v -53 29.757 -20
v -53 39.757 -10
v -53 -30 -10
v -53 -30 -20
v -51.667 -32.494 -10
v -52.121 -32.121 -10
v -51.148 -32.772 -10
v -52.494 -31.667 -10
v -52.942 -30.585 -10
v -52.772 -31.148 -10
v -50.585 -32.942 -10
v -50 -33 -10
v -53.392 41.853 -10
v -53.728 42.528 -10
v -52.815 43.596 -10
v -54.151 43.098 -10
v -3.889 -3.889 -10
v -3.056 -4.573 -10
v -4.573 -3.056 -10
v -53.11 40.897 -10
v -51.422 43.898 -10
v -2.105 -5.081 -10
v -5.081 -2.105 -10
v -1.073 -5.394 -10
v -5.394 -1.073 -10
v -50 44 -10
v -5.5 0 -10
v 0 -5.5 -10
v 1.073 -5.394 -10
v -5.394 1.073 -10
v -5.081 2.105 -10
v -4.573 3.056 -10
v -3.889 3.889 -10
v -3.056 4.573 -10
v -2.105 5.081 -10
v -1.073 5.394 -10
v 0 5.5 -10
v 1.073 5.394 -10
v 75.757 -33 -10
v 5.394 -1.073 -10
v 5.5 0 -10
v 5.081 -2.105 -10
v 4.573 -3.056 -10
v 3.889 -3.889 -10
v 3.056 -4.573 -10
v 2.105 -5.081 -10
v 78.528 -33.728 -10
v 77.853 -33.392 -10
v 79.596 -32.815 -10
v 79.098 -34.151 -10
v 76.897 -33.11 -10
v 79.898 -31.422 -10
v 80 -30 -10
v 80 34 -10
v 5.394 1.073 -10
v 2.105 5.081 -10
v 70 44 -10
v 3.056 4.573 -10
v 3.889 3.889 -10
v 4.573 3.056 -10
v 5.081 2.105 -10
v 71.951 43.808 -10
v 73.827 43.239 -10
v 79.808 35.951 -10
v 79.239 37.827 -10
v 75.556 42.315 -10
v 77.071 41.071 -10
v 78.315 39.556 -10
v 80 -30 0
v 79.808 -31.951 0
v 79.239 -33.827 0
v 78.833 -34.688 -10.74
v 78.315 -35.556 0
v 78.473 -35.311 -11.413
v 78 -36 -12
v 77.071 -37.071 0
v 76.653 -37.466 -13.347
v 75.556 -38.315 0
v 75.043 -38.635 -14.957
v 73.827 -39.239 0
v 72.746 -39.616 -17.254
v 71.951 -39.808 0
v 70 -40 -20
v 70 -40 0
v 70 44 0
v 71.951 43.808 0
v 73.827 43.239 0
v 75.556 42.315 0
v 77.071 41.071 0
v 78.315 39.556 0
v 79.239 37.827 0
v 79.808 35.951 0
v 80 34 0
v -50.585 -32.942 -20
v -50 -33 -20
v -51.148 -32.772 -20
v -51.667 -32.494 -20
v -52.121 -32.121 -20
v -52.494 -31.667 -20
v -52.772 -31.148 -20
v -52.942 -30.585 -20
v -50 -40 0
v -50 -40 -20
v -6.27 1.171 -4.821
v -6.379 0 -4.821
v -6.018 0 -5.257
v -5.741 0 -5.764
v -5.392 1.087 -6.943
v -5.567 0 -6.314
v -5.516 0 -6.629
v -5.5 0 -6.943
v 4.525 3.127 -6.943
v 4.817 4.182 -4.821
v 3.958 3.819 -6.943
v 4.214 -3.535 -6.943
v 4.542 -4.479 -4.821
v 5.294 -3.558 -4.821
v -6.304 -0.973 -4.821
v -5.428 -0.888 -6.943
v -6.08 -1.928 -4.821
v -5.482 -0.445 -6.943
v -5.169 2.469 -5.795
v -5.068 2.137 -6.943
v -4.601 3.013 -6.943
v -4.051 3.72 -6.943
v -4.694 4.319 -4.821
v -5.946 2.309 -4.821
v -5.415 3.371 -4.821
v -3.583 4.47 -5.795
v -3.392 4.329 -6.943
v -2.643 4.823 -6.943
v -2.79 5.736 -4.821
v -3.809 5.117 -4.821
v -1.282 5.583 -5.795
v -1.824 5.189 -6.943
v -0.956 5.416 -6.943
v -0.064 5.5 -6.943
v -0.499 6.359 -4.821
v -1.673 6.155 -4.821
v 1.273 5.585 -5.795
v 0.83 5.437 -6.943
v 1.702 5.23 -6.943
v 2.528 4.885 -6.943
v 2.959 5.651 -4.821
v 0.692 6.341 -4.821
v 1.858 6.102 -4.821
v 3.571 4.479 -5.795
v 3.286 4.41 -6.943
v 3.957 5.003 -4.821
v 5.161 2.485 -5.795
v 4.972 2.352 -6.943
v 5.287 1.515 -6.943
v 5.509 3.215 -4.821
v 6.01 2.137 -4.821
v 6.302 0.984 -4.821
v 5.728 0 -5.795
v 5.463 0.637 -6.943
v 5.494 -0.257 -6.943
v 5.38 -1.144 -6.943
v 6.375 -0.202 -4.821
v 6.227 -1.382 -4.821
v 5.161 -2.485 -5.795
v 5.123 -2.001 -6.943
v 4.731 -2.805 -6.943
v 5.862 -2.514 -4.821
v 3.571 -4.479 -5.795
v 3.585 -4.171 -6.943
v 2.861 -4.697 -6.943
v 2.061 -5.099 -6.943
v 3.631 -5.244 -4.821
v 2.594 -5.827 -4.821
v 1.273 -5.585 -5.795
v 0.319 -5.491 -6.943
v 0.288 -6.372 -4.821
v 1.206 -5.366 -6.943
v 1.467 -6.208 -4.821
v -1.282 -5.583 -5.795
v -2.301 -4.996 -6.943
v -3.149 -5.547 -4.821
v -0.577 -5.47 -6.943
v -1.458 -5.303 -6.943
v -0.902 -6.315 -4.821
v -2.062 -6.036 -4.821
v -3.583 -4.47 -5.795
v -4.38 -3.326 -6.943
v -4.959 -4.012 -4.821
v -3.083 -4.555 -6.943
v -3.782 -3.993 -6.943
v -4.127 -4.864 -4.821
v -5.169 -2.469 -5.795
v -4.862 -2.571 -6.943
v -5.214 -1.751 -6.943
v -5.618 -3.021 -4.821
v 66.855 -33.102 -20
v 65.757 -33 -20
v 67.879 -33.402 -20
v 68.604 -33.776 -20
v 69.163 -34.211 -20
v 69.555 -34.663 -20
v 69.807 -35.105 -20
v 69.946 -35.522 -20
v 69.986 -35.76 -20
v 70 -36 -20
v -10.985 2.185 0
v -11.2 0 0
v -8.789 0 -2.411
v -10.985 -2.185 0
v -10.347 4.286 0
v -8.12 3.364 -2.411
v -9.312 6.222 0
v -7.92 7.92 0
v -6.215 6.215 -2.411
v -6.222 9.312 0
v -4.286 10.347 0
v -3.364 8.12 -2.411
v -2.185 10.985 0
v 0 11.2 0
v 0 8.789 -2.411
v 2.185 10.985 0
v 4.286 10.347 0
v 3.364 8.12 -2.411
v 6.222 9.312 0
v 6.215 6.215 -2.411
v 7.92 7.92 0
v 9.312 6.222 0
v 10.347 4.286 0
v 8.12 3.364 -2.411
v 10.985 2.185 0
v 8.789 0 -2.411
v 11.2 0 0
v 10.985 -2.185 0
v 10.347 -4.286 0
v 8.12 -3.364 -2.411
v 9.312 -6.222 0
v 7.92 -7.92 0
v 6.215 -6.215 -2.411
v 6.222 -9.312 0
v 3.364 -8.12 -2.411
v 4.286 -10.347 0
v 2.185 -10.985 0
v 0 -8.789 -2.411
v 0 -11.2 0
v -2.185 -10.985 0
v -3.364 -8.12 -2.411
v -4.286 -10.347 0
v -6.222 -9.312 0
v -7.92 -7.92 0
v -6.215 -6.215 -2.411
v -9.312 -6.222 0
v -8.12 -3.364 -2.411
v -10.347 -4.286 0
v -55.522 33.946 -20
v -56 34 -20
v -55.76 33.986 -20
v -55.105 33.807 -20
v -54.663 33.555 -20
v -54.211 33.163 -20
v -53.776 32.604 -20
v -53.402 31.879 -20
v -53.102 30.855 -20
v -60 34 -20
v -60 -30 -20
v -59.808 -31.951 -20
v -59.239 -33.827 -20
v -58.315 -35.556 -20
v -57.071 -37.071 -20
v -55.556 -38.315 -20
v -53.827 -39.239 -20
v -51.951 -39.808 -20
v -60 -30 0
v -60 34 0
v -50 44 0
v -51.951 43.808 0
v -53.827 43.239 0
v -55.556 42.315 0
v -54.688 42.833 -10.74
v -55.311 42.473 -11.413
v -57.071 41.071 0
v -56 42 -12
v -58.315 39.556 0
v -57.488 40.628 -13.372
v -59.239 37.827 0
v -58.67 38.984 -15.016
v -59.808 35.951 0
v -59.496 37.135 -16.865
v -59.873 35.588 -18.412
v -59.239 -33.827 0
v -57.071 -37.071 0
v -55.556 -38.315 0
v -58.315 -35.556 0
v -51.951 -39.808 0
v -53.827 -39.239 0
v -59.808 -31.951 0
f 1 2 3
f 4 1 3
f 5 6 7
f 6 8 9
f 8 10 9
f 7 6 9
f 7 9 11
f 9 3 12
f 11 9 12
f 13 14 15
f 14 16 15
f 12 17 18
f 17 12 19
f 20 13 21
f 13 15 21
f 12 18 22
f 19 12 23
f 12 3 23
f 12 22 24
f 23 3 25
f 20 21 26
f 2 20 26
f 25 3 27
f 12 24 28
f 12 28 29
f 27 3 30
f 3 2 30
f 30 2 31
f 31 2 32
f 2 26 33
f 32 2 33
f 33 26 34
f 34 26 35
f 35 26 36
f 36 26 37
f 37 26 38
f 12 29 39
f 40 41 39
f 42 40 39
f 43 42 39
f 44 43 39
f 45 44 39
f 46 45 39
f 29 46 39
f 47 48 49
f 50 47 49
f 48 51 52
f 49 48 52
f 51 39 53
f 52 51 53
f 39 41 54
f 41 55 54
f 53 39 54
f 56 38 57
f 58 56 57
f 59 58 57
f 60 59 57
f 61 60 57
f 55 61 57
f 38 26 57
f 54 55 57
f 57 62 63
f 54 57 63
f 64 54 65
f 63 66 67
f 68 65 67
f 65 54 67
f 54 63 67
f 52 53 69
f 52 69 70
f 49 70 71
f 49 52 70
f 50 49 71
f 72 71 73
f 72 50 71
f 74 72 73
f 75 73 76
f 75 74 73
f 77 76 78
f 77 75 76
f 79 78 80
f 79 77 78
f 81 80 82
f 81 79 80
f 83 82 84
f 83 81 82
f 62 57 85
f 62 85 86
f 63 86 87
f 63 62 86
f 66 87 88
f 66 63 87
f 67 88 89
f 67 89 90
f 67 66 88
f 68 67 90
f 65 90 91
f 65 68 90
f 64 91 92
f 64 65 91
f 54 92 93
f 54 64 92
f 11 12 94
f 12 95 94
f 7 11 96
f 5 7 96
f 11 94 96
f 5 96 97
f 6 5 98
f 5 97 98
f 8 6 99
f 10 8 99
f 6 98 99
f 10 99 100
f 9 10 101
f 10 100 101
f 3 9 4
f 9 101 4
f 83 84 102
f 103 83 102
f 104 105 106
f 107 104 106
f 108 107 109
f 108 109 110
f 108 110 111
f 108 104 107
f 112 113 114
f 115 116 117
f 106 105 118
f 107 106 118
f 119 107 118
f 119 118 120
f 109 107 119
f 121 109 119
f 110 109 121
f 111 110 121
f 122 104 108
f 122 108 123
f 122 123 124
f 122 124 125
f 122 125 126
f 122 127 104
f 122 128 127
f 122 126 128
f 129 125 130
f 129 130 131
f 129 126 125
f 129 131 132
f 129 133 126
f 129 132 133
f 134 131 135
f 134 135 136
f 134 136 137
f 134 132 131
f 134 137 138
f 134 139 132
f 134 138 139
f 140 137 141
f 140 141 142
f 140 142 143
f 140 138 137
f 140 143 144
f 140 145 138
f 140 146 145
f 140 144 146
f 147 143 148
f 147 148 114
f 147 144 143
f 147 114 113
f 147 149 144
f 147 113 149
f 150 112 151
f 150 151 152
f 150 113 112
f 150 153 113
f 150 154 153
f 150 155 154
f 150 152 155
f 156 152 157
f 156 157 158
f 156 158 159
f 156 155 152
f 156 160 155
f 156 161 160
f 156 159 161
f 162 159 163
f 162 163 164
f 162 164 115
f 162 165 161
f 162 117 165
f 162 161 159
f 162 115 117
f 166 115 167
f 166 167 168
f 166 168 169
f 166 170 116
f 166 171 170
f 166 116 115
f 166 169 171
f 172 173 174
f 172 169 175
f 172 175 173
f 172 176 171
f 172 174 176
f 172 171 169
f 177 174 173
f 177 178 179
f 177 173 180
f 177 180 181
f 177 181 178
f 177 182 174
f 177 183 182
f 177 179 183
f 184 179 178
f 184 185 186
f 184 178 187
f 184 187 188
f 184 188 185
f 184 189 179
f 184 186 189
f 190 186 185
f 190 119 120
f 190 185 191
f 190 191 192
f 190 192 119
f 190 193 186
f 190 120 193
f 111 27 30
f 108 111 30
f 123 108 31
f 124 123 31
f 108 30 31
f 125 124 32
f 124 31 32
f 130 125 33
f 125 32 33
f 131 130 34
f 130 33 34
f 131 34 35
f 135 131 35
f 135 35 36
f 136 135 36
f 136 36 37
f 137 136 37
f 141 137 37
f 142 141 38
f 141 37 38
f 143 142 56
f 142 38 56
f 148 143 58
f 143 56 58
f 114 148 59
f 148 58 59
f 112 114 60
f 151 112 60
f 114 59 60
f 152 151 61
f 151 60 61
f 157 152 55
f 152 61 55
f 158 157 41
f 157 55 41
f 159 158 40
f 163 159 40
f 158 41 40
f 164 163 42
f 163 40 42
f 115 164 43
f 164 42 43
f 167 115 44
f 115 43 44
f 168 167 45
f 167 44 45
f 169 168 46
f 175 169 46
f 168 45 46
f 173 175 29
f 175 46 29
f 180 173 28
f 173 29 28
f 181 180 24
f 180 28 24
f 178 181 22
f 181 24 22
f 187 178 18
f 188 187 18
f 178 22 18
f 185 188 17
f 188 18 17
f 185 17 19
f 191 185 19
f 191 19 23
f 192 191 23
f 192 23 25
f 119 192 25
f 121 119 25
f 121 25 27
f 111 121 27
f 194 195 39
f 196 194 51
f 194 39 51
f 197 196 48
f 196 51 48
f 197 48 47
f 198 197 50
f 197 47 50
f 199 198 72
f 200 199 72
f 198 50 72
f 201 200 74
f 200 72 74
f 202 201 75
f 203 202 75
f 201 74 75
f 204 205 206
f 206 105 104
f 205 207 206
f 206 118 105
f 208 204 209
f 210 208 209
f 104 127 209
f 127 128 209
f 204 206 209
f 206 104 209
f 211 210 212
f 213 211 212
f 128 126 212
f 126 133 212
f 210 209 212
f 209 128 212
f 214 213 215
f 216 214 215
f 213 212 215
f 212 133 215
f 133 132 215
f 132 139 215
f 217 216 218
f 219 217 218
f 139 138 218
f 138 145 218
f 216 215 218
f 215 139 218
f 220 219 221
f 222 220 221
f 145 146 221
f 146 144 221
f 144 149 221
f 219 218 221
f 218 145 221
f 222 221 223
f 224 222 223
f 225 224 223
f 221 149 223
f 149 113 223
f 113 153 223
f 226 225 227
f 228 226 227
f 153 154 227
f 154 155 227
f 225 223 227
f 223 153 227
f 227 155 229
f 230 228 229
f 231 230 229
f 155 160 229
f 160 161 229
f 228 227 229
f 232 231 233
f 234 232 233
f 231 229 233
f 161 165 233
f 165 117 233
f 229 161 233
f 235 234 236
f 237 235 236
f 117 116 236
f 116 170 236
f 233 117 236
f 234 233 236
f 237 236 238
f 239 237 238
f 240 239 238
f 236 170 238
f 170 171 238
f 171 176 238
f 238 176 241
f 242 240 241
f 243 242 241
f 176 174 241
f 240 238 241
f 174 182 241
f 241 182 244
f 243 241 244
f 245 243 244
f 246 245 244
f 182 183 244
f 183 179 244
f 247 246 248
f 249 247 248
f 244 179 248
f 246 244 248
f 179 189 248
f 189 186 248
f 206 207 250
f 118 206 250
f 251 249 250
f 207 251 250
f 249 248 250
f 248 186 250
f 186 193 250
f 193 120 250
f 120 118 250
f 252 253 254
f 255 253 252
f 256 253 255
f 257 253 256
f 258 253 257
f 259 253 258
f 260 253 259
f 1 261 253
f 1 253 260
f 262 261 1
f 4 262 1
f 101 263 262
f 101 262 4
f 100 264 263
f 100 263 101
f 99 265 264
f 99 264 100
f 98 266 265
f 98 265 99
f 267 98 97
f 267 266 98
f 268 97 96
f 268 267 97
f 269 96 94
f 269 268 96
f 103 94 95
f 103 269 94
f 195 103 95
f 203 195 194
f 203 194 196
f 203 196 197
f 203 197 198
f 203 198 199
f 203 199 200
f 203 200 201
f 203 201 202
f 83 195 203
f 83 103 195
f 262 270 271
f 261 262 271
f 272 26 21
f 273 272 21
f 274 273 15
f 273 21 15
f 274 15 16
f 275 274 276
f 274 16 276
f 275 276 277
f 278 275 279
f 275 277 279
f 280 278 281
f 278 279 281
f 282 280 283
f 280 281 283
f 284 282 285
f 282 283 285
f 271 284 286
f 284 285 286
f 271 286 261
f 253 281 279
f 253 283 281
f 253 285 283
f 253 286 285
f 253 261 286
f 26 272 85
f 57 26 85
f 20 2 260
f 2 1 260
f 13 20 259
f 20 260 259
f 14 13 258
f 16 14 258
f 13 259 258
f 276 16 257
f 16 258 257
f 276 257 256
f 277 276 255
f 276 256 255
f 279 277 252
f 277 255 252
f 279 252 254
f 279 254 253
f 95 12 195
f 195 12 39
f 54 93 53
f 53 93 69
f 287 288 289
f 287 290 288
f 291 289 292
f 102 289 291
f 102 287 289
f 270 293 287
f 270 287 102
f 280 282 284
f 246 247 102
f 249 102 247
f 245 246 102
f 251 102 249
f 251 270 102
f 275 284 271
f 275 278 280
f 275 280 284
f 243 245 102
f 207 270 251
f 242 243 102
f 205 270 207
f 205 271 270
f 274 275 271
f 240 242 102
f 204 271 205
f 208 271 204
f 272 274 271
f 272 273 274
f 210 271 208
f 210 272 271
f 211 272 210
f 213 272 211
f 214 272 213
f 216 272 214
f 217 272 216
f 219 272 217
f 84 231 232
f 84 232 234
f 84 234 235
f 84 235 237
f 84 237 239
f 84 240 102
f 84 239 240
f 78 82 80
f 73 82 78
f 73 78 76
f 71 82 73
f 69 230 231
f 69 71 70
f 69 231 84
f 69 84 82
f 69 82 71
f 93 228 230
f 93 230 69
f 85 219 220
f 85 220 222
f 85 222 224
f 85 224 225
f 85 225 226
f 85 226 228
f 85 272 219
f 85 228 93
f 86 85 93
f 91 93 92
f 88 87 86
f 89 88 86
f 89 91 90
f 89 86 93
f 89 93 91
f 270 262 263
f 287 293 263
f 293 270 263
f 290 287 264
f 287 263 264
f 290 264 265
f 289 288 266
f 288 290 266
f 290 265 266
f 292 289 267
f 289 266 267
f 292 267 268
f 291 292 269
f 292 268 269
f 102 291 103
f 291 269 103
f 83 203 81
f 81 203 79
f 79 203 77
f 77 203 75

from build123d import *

# Parameters (mm, degrees)
F0_W           = 140
F0_H           = 84
F1_DEPTH       = 10
F2_D           = 11
F2_DEPTH       = 30
F2_CSINK_D     = 22.4
F2_CSINK_ANGLE = 90
F2_TIP         = 3.3047334047
F4_DEPTH       = 10
F5_SIZE        = 10
F6_T1_DEPTH    = 70
F6_T3_DEPTH    = 60
F7_R           = 3


# Not quite as in the source:
# - a fillet or chamfer that OpenCascade refuses, or shapes differently, is made with other operations: its cross-section is extruded or revolved along the edge and cut away or added


with BuildPart() as f1:
    # F0 (on Top) → F1 (new body)
    with BuildSketch(Plane.XY):
        with Locations((10, 2)):
            Rectangle(F0_W, F0_H)
    extrude(amount=-F1_DEPTH)

    # F2
    with Locations(Plane.XY):
        with Locations((0, 0)):
            CounterSinkHole(F2_D / 2, F2_CSINK_D / 2, depth=F2_DEPTH, counter_sink_angle=F2_CSINK_ANGLE)
            with Locations((0, 0, -(F2_DEPTH + F2_TIP / 2))):  # 118° drill point
                Cone(0, F2_D / 2, F2_TIP, mode=Mode.SUBTRACT)

    # F3 (on face) → F4 (join)
    with BuildSketch(Plane(origin=(0, 0, -10), x_dir=(1, 0, 0), z_dir=(0, 0, -1))):
        Polygon((80, 40), (-60, 40), (-60, -44), (-53, -44), (-53, 33), (80, 33), align=None)
    extrude(amount=F4_DEPTH)

    # F5
    f5_edges = [f1.edges().sort_by_distance(p)[0] for p in [
        (-56.5, 44, -20),
        (80, -36.5, -20),
    ]]
    chamfer(f5_edges, length=F5_SIZE)

    # F6: fillet of radius 10 on 4 edges, made by hand

    # F6_s2 → F6_t1 (cut)
    with BuildSketch(Plane.XY.offset(-45)):
        with BuildLine():
            ThreePointArc((-60, -30), (-57.0710678119, -37.0710678119), (-50, -40))
            Line((-50, -40), (-60, -40))
            Line((-60, -40), (-60, -30))
        make_face()
    extrude(amount=F6_T1_DEPTH, mode=Mode.SUBTRACT)

    # F6_s4 → F6_t3 (cut)
    with BuildSketch(Plane.XY.offset(-35)):
        with BuildLine():
            ThreePointArc((80, -30), (77.0710678119, -37.0710678119), (70, -40))
            Line((70, -40), (80, -40))
            Line((80, -40), (80, -30))
        make_face()
        with BuildLine():
            ThreePointArc((70, 44), (77.0710678119, 41.0710678119), (80, 34))
            Line((80, 34), (80, 44))
            Line((80, 44), (70, 44))
        make_face()
        with BuildLine():
            ThreePointArc((-50, 44), (-57.0710678119, 41.0710678119), (-60, 34))
            Line((-60, 34), (-60, 44))
            Line((-60, 44), (-50, 44))
        make_face()
    extrude(amount=F6_T3_DEPTH, mode=Mode.SUBTRACT)

    # F7
    f7_edges = [f1.edges().sort_by_distance(p)[0] for p in [
        (-53, -33, -15),
        (-53, 38.769696, -15.230304),
        (74.769696, -33, -15.230304),
        (-5.5, 0, -5.7),
    ]]
    fillet(f7_edges, radius=F7_R)


solid = f1.part
